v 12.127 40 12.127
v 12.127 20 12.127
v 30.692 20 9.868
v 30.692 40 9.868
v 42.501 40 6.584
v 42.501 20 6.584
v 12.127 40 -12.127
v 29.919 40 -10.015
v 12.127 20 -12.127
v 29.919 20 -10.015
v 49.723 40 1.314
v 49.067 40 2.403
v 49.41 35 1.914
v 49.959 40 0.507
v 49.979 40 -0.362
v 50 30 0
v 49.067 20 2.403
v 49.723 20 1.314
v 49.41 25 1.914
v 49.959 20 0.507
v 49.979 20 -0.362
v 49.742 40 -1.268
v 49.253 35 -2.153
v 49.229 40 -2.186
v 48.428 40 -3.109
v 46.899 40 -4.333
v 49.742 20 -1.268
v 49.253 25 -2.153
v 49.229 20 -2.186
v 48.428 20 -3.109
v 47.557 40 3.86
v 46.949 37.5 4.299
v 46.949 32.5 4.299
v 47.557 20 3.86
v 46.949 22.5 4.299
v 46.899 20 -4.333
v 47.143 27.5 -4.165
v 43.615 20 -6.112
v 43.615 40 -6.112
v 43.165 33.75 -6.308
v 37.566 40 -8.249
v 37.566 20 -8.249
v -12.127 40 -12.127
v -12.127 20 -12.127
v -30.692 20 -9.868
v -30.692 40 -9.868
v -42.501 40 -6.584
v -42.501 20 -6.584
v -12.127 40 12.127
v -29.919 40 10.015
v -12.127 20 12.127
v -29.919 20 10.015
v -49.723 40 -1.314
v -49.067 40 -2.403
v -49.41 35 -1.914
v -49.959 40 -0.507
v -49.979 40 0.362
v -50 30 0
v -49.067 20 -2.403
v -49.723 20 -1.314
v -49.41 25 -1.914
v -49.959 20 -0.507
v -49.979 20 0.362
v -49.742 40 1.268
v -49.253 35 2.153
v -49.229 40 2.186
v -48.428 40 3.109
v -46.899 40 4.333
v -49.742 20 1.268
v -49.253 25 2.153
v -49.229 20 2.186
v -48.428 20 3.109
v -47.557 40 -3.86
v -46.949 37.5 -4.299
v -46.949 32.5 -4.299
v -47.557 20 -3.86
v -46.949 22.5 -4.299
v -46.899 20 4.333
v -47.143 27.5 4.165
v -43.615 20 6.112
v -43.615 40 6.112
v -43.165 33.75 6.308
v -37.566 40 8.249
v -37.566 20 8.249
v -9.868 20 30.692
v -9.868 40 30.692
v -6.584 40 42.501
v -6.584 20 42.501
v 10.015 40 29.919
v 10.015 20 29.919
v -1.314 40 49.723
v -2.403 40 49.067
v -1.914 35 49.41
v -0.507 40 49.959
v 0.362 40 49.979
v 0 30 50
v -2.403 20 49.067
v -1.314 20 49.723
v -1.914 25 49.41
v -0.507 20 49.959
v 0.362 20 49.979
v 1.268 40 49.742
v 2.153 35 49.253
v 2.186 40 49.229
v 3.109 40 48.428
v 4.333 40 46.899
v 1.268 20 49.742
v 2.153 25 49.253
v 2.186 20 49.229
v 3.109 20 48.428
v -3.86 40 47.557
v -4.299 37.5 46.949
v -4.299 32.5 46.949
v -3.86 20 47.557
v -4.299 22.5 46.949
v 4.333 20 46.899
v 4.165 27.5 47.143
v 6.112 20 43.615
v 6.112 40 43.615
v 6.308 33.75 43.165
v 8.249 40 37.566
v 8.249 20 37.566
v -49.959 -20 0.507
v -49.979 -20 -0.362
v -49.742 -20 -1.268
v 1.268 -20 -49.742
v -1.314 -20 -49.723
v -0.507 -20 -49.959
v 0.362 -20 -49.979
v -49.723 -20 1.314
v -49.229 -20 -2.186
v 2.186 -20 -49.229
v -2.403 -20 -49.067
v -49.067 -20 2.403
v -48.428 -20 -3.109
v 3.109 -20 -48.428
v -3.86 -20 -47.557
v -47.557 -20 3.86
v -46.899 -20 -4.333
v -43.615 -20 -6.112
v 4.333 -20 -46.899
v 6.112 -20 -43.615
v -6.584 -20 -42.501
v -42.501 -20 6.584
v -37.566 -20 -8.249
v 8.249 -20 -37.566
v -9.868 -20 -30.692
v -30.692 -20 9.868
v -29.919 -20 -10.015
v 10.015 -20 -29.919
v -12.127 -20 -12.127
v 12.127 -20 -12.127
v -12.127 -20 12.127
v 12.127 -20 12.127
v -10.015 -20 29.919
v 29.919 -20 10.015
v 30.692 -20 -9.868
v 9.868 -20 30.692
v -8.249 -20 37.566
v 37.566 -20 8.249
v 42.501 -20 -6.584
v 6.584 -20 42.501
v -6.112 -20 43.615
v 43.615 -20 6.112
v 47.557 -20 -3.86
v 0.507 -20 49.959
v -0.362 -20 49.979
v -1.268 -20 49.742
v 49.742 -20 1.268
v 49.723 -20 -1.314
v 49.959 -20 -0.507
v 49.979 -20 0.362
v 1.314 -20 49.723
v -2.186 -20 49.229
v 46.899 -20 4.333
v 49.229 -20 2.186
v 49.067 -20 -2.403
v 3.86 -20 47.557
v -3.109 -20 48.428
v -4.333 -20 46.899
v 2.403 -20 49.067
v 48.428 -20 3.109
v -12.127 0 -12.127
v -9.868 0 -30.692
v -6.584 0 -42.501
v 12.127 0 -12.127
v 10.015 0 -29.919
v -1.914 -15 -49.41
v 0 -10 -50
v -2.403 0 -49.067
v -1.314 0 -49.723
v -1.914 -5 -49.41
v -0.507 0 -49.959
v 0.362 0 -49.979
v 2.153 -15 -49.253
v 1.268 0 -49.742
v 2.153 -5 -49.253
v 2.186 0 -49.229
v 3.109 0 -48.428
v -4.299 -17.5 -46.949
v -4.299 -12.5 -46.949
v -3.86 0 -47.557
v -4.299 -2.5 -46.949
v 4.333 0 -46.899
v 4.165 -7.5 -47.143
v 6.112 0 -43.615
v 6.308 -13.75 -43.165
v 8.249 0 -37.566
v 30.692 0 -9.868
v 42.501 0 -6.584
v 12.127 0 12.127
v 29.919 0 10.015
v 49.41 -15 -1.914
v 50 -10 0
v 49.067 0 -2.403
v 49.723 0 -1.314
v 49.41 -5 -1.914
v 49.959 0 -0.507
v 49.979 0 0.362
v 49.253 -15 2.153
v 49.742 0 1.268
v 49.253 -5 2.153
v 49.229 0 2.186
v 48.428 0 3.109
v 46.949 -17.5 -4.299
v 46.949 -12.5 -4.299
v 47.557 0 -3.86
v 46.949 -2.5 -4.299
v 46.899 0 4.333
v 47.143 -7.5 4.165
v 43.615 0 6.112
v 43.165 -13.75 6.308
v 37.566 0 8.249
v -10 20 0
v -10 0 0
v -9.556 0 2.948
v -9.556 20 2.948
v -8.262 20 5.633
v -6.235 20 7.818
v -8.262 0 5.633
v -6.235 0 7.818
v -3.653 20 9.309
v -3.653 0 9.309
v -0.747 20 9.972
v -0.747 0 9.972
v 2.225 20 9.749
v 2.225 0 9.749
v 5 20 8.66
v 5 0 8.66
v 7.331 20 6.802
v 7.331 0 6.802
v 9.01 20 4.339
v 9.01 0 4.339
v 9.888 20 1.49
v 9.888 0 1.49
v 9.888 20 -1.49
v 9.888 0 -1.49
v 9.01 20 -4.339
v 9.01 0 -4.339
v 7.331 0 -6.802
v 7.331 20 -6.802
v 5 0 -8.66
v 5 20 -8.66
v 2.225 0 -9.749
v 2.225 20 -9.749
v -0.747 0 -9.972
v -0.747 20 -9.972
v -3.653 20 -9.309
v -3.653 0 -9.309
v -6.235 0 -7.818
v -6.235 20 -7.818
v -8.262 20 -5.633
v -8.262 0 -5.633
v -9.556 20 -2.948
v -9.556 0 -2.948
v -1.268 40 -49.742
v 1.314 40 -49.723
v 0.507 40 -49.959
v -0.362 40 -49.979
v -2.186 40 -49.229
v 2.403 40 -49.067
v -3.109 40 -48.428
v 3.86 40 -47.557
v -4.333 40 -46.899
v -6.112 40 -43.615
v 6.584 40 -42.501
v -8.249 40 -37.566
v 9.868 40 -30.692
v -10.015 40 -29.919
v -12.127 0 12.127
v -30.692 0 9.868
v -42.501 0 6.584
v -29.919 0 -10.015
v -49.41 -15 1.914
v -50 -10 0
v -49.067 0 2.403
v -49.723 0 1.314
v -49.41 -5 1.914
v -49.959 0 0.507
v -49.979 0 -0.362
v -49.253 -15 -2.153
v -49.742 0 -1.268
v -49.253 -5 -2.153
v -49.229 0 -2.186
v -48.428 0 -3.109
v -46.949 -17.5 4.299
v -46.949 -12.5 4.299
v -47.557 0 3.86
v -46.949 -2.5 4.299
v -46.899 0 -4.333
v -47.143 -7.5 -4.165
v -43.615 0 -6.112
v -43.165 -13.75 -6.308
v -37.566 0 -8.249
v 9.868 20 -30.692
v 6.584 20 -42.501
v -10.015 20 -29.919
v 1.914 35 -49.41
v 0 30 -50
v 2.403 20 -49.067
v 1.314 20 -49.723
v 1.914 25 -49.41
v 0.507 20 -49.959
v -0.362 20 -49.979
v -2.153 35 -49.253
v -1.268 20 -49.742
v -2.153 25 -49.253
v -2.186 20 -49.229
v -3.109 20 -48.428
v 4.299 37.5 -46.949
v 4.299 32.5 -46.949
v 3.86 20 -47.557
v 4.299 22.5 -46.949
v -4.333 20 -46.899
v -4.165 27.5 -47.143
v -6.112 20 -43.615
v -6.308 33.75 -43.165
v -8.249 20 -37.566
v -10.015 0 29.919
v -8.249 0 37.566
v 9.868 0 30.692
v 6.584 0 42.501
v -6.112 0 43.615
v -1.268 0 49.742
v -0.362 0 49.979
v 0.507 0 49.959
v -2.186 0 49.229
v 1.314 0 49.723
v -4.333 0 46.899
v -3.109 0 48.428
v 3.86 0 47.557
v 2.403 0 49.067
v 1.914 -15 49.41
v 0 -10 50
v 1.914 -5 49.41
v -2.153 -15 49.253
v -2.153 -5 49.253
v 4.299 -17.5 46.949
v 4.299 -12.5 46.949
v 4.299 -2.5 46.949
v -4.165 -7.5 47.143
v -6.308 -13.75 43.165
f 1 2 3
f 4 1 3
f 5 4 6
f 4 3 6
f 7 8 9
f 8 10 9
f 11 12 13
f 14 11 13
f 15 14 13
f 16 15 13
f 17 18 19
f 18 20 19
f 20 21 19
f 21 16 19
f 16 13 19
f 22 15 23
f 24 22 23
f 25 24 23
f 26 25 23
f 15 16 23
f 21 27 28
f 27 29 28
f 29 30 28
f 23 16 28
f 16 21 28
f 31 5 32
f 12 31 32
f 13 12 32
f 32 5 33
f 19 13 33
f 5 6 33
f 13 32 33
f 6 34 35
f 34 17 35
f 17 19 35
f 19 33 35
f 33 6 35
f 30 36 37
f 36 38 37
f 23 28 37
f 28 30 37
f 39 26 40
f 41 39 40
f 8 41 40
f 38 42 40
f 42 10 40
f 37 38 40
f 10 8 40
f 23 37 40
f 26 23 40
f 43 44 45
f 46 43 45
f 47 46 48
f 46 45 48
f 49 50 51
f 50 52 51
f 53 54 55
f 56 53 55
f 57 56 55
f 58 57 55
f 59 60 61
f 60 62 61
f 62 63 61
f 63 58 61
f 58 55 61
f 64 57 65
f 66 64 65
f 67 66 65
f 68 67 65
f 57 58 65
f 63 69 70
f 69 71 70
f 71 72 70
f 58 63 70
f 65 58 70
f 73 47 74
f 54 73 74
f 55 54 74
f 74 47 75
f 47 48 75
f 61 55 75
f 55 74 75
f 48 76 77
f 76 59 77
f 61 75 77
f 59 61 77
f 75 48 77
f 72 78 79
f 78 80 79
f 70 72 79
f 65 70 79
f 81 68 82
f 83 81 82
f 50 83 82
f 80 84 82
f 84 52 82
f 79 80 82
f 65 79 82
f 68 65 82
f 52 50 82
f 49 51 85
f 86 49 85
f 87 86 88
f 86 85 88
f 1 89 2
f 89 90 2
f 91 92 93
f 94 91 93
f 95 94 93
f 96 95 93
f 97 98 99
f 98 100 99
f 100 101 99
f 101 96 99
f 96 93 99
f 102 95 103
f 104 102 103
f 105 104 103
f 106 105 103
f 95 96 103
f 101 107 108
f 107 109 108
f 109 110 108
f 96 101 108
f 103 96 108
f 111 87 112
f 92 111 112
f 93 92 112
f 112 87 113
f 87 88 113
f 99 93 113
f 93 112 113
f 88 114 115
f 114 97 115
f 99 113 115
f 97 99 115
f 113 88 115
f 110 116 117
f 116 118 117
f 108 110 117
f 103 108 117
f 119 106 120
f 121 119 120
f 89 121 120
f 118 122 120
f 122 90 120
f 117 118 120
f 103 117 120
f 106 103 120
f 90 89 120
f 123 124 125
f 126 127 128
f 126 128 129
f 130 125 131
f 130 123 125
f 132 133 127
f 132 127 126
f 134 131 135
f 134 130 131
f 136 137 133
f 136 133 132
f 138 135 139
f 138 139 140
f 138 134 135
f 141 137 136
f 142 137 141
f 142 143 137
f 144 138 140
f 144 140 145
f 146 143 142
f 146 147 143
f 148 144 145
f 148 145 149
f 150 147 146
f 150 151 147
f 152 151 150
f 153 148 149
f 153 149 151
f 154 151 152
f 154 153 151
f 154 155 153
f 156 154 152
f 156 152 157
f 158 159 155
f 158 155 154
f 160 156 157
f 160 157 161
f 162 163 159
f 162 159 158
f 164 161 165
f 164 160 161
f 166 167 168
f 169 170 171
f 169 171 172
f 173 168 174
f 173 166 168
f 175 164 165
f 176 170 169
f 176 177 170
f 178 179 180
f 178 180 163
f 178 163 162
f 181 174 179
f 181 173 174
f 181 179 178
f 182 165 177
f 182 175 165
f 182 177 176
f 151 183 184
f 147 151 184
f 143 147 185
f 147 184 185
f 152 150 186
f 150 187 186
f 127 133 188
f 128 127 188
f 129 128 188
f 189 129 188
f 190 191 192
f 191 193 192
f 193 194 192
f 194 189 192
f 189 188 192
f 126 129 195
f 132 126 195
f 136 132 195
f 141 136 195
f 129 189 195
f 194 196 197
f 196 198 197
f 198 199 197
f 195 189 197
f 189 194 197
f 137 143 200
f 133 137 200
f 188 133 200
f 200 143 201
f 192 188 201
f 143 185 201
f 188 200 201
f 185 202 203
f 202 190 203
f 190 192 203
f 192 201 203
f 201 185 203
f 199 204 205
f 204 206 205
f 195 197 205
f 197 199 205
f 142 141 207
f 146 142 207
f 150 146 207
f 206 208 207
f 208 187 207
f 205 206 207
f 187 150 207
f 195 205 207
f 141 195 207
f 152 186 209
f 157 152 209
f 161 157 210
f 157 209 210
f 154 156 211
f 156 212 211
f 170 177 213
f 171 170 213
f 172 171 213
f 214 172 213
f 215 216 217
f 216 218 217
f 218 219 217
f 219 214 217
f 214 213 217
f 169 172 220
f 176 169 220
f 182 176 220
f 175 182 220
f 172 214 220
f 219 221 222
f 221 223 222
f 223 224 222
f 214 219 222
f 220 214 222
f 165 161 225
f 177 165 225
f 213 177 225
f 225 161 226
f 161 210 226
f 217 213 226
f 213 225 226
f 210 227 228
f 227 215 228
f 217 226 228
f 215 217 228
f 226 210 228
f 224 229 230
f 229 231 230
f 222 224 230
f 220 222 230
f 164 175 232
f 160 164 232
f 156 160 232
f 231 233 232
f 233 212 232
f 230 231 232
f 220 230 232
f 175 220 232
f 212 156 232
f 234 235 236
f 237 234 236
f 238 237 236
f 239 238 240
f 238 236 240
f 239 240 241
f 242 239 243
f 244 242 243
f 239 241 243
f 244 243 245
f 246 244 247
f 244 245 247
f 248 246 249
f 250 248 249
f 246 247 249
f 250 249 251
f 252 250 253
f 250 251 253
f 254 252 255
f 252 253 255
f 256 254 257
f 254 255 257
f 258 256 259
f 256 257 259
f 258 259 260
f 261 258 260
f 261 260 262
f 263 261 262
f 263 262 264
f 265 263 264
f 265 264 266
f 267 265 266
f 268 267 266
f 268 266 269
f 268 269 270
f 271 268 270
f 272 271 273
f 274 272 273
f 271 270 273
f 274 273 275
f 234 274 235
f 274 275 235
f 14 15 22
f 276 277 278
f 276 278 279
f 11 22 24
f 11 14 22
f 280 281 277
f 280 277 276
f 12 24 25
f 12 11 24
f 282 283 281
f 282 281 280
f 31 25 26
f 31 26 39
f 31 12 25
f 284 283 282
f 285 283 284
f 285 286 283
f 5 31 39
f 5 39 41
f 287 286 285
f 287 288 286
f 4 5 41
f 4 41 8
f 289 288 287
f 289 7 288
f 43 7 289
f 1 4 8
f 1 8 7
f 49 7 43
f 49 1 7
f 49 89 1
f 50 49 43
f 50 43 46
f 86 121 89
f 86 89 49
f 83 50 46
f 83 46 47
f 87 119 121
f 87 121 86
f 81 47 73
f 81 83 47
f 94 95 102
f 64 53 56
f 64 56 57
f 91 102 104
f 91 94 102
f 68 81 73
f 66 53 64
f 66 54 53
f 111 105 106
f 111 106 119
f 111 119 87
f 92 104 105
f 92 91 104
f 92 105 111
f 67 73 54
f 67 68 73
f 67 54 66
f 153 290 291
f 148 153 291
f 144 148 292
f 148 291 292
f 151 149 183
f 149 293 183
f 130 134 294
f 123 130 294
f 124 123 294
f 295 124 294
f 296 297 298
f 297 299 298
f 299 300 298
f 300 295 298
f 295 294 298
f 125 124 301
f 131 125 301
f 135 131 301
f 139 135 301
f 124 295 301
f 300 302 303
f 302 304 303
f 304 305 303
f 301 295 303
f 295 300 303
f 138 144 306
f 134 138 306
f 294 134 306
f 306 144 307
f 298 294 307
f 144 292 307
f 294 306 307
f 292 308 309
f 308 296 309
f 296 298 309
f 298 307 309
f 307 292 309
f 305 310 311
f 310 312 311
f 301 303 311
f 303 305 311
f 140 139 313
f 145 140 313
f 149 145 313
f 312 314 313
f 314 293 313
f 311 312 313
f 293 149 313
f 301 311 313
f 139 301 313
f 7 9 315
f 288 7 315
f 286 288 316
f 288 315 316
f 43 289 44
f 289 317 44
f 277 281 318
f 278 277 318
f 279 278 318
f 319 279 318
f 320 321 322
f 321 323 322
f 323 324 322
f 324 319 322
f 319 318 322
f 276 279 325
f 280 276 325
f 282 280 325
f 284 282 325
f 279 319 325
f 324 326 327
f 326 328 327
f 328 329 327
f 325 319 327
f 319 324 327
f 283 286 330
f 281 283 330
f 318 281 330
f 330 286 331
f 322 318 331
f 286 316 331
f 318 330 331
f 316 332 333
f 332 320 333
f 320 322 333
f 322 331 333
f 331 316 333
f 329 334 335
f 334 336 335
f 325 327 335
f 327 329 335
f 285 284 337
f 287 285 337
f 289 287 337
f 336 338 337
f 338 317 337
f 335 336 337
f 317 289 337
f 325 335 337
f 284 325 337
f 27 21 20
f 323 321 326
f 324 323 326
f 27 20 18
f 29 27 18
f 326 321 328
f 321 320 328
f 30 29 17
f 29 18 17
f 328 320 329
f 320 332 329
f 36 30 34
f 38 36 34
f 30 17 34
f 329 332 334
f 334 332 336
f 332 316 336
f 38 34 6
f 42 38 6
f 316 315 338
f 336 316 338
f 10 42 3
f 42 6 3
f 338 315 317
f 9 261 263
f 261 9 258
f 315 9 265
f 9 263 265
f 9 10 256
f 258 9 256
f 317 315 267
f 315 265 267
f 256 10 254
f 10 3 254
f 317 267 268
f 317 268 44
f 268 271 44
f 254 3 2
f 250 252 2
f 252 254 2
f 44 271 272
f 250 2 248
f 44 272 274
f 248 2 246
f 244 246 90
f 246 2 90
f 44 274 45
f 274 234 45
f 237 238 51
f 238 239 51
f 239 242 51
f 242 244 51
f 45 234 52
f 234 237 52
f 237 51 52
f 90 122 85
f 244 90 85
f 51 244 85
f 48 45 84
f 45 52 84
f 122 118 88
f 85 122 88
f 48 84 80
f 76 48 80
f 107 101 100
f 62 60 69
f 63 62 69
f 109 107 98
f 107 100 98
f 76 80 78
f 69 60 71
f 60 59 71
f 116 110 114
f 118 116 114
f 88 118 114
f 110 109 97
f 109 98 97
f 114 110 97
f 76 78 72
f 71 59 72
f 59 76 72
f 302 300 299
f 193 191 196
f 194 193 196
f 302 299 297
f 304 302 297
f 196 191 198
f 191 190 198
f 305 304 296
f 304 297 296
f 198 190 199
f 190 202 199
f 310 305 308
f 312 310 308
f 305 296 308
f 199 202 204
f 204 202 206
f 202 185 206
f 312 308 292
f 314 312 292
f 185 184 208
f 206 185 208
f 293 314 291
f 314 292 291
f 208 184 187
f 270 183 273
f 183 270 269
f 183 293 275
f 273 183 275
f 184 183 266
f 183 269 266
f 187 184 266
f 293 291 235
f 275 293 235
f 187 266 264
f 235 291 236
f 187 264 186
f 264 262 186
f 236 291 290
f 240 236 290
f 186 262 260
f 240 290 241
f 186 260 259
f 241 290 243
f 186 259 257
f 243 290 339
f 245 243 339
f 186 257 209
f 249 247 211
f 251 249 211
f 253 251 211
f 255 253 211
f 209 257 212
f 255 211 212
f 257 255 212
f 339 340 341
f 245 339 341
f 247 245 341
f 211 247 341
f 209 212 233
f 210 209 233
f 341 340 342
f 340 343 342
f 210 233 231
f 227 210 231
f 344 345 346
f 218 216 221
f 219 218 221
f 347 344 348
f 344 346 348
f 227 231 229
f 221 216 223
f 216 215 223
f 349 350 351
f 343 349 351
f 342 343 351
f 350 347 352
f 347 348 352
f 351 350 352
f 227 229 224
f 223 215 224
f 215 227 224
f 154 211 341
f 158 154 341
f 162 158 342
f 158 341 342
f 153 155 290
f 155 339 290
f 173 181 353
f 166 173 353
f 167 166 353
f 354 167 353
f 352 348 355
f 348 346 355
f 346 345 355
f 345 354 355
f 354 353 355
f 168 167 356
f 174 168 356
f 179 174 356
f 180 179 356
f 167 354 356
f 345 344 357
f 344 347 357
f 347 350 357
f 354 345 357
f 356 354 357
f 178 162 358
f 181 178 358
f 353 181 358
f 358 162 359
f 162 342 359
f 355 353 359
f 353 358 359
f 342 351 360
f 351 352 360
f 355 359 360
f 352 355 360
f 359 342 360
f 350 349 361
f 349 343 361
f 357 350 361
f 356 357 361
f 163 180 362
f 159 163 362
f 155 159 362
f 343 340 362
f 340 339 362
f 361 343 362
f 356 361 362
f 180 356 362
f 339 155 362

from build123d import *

# Parameters (mm, degrees)
F1_DEPTH = 20
F2_R     = 10
F3_DEPTH = 20
F5_DEPTH = 20


with BuildPart() as f1:
    # F0 (on Front) → F1 (new body)
    with BuildSketch(Plane.XZ):
        with BuildLine():
            add(Edge.make_bspline(
                [(12.1267812518, 12.1267812518), (9.7597050801, 50), (0, 50)],
                knots=[4.9573676435, 4.9573676435, 4.9573676435, 6.2831853072, 6.2831853072, 6.2831853072], degree=2, weights=[1, 0.788205438, 1]))
            add(Edge.make_bspline(
                [(0, 50), (-9.7597050801, 50), (-12.1267812518, 12.1267812518)],
                knots=[0, 0, 0, 1.3258176637, 1.3258176637, 1.3258176637], degree=2, weights=[1, 0.788205438, 1]))
            add(Edge.make_bspline(
                [(12.1267812518, 12.1267812518), (0, 12.8847050801), (-12.1267812518, 12.1267812518)],
                knots=[1.3258176637, 1.3258176637, 1.3258176637, 1.8157749899, 1.8157749899, 1.8157749899], degree=2, weights=[1, 0.9701425001, 1]))
        make_face()
        with BuildLine():
            add(Edge.make_bspline(
                [(12.1267812518, 12.1267812518), (0, 12.8847050801), (-12.1267812518, 12.1267812518)],
                knots=[1.3258176637, 1.3258176637, 1.3258176637, 1.8157749899, 1.8157749899, 1.8157749899], degree=2, weights=[1, 0.9701425001, 1]))
            add(Edge.make_bspline(
                [(-12.1267812518, 12.1267812518), (-12.8847050801, 0), (-12.1267812518, -12.1267812518)],
                knots=[1.3258176637, 1.3258176637, 1.3258176637, 1.8157749899, 1.8157749899, 1.8157749899], degree=2, weights=[1, 0.9701425001, 1]))
            add(Edge.make_bspline(
                [(-12.1267812518, -12.1267812518), (0, -12.8847050801), (12.1267812518, -12.1267812518)],
                knots=[4.4674103173, 4.4674103173, 4.4674103173, 4.9573676435, 4.9573676435, 4.9573676435], degree=2, weights=[1, 0.9701425001, 1]))
            add(Edge.make_bspline(
                [(12.1267812518, -12.1267812518), (12.8847050801, 0), (12.1267812518, 12.1267812518)],
                knots=[4.4674103173, 4.4674103173, 4.4674103173, 4.9573676435, 4.9573676435, 4.9573676435], degree=2, weights=[1, 0.9701425001, 1]))
        make_face()
        with BuildLine():
            add(Edge.make_bspline(
                [(-12.1267812518, 12.1267812518), (-12.8847050801, 0), (-12.1267812518, -12.1267812518)],
                knots=[1.3258176637, 1.3258176637, 1.3258176637, 1.8157749899, 1.8157749899, 1.8157749899], degree=2, weights=[1, 0.9701425001, 1]))
            add(Edge.make_bspline(
                [(-12.1267812518, 12.1267812518), (-50, 9.7597050801), (-50, 0), (-50, -9.7597050801), (-12.1267812518, -12.1267812518)],
                knots=[1.8157749899, 1.8157749899, 1.8157749899, 3.1415926536, 3.1415926536, 4.4674103173, 4.4674103173, 4.4674103173], degree=2, weights=[1, 0.788205438, 1, 0.788205438, 1]))
        make_face()
        with BuildLine():
            add(Edge.make_bspline(
                [(50, 0), (50, 9.7597050801), (12.1267812518, 12.1267812518)],
                knots=[0, 0, 0, 1.3258176637, 1.3258176637, 1.3258176637], degree=2, weights=[1, 0.788205438, 1]))
            add(Edge.make_bspline(
                [(12.1267812518, -12.1267812518), (12.8847050801, 0), (12.1267812518, 12.1267812518)],
                knots=[4.4674103173, 4.4674103173, 4.4674103173, 4.9573676435, 4.9573676435, 4.9573676435], degree=2, weights=[1, 0.9701425001, 1]))
            add(Edge.make_bspline(
                [(12.1267812518, -12.1267812518), (50, -9.7597050801), (50, 0)],
                knots=[4.9573676435, 4.9573676435, 4.9573676435, 6.2831853072, 6.2831853072, 6.2831853072], degree=2, weights=[1, 0.788205438, 1]))
        make_face()
        with BuildLine():
            add(Edge.make_bspline(
                [(-12.1267812518, -12.1267812518), (0, -12.8847050801), (12.1267812518, -12.1267812518)],
                knots=[4.4674103173, 4.4674103173, 4.4674103173, 4.9573676435, 4.9573676435, 4.9573676435], degree=2, weights=[1, 0.9701425001, 1]))
            add(Edge.make_bspline(
                [(-12.1267812518, -12.1267812518), (-9.7597050801, -50), (0, -50), (9.7597050801, -50), (12.1267812518, -12.1267812518)],
                knots=[1.8157749899, 1.8157749899, 1.8157749899, 3.1415926536, 3.1415926536, 4.4674103173, 4.4674103173, 4.4674103173], degree=2, weights=[1, 0.788205438, 1, 0.788205438, 1]))
        make_face()
    extrude(amount=F1_DEPTH)

    # F2 (on face) → F3 (join)
    with BuildSketch(Plane(origin=(0, 0, 0), x_dir=(-1, 0, 0), z_dir=(0, 1, 0))):
        Circle(F2_R)
    extrude(amount=F3_DEPTH)

    # F4 (on face) → F5 (join)
    with BuildSketch(Plane(origin=(0, 20, 0), x_dir=(-1, 0, 0), z_dir=(0, 1, 0))):
        with BuildLine():
            add(Edge.make_bspline(
                [(12.1267812518, 12.1267812518), (9.7597050801, 50), (0, 50)],
                knots=[4.9573676435, 4.9573676435, 4.9573676435, 6.2831853072, 6.2831853072, 6.2831853072], degree=2, weights=[1, 0.788205438, 1]))
            add(Edge.make_bspline(
                [(0, 50), (-9.7597050801, 50), (-12.1267812518, 12.1267812518)],
                knots=[0, 0, 0, 1.3258176637, 1.3258176637, 1.3258176637], degree=2, weights=[1, 0.788205438, 1]))
            add(Edge.make_bspline(
                [(12.1267812518, 12.1267812518), (0, 12.8847050801), (-12.1267812518, 12.1267812518)],
                knots=[1.3258176637, 1.3258176637, 1.3258176637, 1.8157749899, 1.8157749899, 1.8157749899], degree=2, weights=[1, 0.9701425001, 1]))
        make_face()
        with BuildLine():
            add(Edge.make_bspline(
                [(12.1267812518, 12.1267812518), (0, 12.8847050801), (-12.1267812518, 12.1267812518)],
                knots=[1.3258176637, 1.3258176637, 1.3258176637, 1.8157749899, 1.8157749899, 1.8157749899], degree=2, weights=[1, 0.9701425001, 1]))
            add(Edge.make_bspline(
                [(-12.1267812518, 12.1267812518), (-12.8847050801, 0), (-12.1267812518, -12.1267812518)],
                knots=[1.3258176637, 1.3258176637, 1.3258176637, 1.8157749899, 1.8157749899, 1.8157749899], degree=2, weights=[1, 0.9701425001, 1]))
            add(Edge.make_bspline(
                [(-12.1267812518, -12.1267812518), (0, -12.8847050801), (12.1267812518, -12.1267812518)],
                knots=[4.4674103173, 4.4674103173, 4.4674103173, 4.9573676435, 4.9573676435, 4.9573676435], degree=2, weights=[1, 0.9701425001, 1]))
            add(Edge.make_bspline(
                [(12.1267812518, -12.1267812518), (12.8847050801, 0), (12.1267812518, 12.1267812518)],
                knots=[4.4674103173, 4.4674103173, 4.4674103173, 4.9573676435, 4.9573676435, 4.9573676435], degree=2, weights=[1, 0.9701425001, 1]))
        make_face()
        with BuildLine():
            add(Edge.make_bspline(
                [(-12.1267812518, 12.1267812518), (-12.8847050801, 0), (-12.1267812518, -12.1267812518)],
                knots=[1.3258176637, 1.3258176637, 1.3258176637, 1.8157749899, 1.8157749899, 1.8157749899], degree=2, weights=[1, 0.9701425001, 1]))
            add(Edge.make_bspline(
                [(-12.1267812518, 12.1267812518), (-50, 9.7597050801), (-50, 0), (-50, -9.7597050801), (-12.1267812518, -12.1267812518)],
                knots=[1.8157749899, 1.8157749899, 1.8157749899, 3.1415926536, 3.1415926536, 4.4674103173, 4.4674103173, 4.4674103173], degree=2, weights=[1, 0.788205438, 1, 0.788205438, 1]))
        make_face()
        with BuildLine():
            add(Edge.make_bspline(
                [(50, 0), (50, 9.7597050801), (12.1267812518, 12.1267812518)],
                knots=[0, 0, 0, 1.3258176637, 1.3258176637, 1.3258176637], degree=2, weights=[1, 0.788205438, 1]))
            add(Edge.make_bspline(
                [(12.1267812518, -12.1267812518), (12.8847050801, 0), (12.1267812518, 12.1267812518)],
                knots=[4.4674103173, 4.4674103173, 4.4674103173, 4.9573676435, 4.9573676435, 4.9573676435], degree=2, weights=[1, 0.9701425001, 1]))
            add(Edge.make_bspline(
                [(12.1267812518, -12.1267812518), (50, -9.7597050801), (50, 0)],
                knots=[4.9573676435, 4.9573676435, 4.9573676435, 6.2831853072, 6.2831853072, 6.2831853072], degree=2, weights=[1, 0.788205438, 1]))
        make_face()
        with BuildLine():
            add(Edge.make_bspline(
                [(-12.1267812518, -12.1267812518), (0, -12.8847050801), (12.1267812518, -12.1267812518)],
                knots=[4.4674103173, 4.4674103173, 4.4674103173, 4.9573676435, 4.9573676435, 4.9573676435], degree=2, weights=[1, 0.9701425001, 1]))
            add(Edge.make_bspline(
                [(-12.1267812518, -12.1267812518), (-9.7597050801, -50), (0, -50), (9.7597050801, -50), (12.1267812518, -12.1267812518)],
                knots=[1.8157749899, 1.8157749899, 1.8157749899, 3.1415926536, 3.1415926536, 4.4674103173, 4.4674103173, 4.4674103173], degree=2, weights=[1, 0.788205438, 1, 0.788205438, 1]))
        make_face()
    extrude(amount=F5_DEPTH)


solid = f1.part
